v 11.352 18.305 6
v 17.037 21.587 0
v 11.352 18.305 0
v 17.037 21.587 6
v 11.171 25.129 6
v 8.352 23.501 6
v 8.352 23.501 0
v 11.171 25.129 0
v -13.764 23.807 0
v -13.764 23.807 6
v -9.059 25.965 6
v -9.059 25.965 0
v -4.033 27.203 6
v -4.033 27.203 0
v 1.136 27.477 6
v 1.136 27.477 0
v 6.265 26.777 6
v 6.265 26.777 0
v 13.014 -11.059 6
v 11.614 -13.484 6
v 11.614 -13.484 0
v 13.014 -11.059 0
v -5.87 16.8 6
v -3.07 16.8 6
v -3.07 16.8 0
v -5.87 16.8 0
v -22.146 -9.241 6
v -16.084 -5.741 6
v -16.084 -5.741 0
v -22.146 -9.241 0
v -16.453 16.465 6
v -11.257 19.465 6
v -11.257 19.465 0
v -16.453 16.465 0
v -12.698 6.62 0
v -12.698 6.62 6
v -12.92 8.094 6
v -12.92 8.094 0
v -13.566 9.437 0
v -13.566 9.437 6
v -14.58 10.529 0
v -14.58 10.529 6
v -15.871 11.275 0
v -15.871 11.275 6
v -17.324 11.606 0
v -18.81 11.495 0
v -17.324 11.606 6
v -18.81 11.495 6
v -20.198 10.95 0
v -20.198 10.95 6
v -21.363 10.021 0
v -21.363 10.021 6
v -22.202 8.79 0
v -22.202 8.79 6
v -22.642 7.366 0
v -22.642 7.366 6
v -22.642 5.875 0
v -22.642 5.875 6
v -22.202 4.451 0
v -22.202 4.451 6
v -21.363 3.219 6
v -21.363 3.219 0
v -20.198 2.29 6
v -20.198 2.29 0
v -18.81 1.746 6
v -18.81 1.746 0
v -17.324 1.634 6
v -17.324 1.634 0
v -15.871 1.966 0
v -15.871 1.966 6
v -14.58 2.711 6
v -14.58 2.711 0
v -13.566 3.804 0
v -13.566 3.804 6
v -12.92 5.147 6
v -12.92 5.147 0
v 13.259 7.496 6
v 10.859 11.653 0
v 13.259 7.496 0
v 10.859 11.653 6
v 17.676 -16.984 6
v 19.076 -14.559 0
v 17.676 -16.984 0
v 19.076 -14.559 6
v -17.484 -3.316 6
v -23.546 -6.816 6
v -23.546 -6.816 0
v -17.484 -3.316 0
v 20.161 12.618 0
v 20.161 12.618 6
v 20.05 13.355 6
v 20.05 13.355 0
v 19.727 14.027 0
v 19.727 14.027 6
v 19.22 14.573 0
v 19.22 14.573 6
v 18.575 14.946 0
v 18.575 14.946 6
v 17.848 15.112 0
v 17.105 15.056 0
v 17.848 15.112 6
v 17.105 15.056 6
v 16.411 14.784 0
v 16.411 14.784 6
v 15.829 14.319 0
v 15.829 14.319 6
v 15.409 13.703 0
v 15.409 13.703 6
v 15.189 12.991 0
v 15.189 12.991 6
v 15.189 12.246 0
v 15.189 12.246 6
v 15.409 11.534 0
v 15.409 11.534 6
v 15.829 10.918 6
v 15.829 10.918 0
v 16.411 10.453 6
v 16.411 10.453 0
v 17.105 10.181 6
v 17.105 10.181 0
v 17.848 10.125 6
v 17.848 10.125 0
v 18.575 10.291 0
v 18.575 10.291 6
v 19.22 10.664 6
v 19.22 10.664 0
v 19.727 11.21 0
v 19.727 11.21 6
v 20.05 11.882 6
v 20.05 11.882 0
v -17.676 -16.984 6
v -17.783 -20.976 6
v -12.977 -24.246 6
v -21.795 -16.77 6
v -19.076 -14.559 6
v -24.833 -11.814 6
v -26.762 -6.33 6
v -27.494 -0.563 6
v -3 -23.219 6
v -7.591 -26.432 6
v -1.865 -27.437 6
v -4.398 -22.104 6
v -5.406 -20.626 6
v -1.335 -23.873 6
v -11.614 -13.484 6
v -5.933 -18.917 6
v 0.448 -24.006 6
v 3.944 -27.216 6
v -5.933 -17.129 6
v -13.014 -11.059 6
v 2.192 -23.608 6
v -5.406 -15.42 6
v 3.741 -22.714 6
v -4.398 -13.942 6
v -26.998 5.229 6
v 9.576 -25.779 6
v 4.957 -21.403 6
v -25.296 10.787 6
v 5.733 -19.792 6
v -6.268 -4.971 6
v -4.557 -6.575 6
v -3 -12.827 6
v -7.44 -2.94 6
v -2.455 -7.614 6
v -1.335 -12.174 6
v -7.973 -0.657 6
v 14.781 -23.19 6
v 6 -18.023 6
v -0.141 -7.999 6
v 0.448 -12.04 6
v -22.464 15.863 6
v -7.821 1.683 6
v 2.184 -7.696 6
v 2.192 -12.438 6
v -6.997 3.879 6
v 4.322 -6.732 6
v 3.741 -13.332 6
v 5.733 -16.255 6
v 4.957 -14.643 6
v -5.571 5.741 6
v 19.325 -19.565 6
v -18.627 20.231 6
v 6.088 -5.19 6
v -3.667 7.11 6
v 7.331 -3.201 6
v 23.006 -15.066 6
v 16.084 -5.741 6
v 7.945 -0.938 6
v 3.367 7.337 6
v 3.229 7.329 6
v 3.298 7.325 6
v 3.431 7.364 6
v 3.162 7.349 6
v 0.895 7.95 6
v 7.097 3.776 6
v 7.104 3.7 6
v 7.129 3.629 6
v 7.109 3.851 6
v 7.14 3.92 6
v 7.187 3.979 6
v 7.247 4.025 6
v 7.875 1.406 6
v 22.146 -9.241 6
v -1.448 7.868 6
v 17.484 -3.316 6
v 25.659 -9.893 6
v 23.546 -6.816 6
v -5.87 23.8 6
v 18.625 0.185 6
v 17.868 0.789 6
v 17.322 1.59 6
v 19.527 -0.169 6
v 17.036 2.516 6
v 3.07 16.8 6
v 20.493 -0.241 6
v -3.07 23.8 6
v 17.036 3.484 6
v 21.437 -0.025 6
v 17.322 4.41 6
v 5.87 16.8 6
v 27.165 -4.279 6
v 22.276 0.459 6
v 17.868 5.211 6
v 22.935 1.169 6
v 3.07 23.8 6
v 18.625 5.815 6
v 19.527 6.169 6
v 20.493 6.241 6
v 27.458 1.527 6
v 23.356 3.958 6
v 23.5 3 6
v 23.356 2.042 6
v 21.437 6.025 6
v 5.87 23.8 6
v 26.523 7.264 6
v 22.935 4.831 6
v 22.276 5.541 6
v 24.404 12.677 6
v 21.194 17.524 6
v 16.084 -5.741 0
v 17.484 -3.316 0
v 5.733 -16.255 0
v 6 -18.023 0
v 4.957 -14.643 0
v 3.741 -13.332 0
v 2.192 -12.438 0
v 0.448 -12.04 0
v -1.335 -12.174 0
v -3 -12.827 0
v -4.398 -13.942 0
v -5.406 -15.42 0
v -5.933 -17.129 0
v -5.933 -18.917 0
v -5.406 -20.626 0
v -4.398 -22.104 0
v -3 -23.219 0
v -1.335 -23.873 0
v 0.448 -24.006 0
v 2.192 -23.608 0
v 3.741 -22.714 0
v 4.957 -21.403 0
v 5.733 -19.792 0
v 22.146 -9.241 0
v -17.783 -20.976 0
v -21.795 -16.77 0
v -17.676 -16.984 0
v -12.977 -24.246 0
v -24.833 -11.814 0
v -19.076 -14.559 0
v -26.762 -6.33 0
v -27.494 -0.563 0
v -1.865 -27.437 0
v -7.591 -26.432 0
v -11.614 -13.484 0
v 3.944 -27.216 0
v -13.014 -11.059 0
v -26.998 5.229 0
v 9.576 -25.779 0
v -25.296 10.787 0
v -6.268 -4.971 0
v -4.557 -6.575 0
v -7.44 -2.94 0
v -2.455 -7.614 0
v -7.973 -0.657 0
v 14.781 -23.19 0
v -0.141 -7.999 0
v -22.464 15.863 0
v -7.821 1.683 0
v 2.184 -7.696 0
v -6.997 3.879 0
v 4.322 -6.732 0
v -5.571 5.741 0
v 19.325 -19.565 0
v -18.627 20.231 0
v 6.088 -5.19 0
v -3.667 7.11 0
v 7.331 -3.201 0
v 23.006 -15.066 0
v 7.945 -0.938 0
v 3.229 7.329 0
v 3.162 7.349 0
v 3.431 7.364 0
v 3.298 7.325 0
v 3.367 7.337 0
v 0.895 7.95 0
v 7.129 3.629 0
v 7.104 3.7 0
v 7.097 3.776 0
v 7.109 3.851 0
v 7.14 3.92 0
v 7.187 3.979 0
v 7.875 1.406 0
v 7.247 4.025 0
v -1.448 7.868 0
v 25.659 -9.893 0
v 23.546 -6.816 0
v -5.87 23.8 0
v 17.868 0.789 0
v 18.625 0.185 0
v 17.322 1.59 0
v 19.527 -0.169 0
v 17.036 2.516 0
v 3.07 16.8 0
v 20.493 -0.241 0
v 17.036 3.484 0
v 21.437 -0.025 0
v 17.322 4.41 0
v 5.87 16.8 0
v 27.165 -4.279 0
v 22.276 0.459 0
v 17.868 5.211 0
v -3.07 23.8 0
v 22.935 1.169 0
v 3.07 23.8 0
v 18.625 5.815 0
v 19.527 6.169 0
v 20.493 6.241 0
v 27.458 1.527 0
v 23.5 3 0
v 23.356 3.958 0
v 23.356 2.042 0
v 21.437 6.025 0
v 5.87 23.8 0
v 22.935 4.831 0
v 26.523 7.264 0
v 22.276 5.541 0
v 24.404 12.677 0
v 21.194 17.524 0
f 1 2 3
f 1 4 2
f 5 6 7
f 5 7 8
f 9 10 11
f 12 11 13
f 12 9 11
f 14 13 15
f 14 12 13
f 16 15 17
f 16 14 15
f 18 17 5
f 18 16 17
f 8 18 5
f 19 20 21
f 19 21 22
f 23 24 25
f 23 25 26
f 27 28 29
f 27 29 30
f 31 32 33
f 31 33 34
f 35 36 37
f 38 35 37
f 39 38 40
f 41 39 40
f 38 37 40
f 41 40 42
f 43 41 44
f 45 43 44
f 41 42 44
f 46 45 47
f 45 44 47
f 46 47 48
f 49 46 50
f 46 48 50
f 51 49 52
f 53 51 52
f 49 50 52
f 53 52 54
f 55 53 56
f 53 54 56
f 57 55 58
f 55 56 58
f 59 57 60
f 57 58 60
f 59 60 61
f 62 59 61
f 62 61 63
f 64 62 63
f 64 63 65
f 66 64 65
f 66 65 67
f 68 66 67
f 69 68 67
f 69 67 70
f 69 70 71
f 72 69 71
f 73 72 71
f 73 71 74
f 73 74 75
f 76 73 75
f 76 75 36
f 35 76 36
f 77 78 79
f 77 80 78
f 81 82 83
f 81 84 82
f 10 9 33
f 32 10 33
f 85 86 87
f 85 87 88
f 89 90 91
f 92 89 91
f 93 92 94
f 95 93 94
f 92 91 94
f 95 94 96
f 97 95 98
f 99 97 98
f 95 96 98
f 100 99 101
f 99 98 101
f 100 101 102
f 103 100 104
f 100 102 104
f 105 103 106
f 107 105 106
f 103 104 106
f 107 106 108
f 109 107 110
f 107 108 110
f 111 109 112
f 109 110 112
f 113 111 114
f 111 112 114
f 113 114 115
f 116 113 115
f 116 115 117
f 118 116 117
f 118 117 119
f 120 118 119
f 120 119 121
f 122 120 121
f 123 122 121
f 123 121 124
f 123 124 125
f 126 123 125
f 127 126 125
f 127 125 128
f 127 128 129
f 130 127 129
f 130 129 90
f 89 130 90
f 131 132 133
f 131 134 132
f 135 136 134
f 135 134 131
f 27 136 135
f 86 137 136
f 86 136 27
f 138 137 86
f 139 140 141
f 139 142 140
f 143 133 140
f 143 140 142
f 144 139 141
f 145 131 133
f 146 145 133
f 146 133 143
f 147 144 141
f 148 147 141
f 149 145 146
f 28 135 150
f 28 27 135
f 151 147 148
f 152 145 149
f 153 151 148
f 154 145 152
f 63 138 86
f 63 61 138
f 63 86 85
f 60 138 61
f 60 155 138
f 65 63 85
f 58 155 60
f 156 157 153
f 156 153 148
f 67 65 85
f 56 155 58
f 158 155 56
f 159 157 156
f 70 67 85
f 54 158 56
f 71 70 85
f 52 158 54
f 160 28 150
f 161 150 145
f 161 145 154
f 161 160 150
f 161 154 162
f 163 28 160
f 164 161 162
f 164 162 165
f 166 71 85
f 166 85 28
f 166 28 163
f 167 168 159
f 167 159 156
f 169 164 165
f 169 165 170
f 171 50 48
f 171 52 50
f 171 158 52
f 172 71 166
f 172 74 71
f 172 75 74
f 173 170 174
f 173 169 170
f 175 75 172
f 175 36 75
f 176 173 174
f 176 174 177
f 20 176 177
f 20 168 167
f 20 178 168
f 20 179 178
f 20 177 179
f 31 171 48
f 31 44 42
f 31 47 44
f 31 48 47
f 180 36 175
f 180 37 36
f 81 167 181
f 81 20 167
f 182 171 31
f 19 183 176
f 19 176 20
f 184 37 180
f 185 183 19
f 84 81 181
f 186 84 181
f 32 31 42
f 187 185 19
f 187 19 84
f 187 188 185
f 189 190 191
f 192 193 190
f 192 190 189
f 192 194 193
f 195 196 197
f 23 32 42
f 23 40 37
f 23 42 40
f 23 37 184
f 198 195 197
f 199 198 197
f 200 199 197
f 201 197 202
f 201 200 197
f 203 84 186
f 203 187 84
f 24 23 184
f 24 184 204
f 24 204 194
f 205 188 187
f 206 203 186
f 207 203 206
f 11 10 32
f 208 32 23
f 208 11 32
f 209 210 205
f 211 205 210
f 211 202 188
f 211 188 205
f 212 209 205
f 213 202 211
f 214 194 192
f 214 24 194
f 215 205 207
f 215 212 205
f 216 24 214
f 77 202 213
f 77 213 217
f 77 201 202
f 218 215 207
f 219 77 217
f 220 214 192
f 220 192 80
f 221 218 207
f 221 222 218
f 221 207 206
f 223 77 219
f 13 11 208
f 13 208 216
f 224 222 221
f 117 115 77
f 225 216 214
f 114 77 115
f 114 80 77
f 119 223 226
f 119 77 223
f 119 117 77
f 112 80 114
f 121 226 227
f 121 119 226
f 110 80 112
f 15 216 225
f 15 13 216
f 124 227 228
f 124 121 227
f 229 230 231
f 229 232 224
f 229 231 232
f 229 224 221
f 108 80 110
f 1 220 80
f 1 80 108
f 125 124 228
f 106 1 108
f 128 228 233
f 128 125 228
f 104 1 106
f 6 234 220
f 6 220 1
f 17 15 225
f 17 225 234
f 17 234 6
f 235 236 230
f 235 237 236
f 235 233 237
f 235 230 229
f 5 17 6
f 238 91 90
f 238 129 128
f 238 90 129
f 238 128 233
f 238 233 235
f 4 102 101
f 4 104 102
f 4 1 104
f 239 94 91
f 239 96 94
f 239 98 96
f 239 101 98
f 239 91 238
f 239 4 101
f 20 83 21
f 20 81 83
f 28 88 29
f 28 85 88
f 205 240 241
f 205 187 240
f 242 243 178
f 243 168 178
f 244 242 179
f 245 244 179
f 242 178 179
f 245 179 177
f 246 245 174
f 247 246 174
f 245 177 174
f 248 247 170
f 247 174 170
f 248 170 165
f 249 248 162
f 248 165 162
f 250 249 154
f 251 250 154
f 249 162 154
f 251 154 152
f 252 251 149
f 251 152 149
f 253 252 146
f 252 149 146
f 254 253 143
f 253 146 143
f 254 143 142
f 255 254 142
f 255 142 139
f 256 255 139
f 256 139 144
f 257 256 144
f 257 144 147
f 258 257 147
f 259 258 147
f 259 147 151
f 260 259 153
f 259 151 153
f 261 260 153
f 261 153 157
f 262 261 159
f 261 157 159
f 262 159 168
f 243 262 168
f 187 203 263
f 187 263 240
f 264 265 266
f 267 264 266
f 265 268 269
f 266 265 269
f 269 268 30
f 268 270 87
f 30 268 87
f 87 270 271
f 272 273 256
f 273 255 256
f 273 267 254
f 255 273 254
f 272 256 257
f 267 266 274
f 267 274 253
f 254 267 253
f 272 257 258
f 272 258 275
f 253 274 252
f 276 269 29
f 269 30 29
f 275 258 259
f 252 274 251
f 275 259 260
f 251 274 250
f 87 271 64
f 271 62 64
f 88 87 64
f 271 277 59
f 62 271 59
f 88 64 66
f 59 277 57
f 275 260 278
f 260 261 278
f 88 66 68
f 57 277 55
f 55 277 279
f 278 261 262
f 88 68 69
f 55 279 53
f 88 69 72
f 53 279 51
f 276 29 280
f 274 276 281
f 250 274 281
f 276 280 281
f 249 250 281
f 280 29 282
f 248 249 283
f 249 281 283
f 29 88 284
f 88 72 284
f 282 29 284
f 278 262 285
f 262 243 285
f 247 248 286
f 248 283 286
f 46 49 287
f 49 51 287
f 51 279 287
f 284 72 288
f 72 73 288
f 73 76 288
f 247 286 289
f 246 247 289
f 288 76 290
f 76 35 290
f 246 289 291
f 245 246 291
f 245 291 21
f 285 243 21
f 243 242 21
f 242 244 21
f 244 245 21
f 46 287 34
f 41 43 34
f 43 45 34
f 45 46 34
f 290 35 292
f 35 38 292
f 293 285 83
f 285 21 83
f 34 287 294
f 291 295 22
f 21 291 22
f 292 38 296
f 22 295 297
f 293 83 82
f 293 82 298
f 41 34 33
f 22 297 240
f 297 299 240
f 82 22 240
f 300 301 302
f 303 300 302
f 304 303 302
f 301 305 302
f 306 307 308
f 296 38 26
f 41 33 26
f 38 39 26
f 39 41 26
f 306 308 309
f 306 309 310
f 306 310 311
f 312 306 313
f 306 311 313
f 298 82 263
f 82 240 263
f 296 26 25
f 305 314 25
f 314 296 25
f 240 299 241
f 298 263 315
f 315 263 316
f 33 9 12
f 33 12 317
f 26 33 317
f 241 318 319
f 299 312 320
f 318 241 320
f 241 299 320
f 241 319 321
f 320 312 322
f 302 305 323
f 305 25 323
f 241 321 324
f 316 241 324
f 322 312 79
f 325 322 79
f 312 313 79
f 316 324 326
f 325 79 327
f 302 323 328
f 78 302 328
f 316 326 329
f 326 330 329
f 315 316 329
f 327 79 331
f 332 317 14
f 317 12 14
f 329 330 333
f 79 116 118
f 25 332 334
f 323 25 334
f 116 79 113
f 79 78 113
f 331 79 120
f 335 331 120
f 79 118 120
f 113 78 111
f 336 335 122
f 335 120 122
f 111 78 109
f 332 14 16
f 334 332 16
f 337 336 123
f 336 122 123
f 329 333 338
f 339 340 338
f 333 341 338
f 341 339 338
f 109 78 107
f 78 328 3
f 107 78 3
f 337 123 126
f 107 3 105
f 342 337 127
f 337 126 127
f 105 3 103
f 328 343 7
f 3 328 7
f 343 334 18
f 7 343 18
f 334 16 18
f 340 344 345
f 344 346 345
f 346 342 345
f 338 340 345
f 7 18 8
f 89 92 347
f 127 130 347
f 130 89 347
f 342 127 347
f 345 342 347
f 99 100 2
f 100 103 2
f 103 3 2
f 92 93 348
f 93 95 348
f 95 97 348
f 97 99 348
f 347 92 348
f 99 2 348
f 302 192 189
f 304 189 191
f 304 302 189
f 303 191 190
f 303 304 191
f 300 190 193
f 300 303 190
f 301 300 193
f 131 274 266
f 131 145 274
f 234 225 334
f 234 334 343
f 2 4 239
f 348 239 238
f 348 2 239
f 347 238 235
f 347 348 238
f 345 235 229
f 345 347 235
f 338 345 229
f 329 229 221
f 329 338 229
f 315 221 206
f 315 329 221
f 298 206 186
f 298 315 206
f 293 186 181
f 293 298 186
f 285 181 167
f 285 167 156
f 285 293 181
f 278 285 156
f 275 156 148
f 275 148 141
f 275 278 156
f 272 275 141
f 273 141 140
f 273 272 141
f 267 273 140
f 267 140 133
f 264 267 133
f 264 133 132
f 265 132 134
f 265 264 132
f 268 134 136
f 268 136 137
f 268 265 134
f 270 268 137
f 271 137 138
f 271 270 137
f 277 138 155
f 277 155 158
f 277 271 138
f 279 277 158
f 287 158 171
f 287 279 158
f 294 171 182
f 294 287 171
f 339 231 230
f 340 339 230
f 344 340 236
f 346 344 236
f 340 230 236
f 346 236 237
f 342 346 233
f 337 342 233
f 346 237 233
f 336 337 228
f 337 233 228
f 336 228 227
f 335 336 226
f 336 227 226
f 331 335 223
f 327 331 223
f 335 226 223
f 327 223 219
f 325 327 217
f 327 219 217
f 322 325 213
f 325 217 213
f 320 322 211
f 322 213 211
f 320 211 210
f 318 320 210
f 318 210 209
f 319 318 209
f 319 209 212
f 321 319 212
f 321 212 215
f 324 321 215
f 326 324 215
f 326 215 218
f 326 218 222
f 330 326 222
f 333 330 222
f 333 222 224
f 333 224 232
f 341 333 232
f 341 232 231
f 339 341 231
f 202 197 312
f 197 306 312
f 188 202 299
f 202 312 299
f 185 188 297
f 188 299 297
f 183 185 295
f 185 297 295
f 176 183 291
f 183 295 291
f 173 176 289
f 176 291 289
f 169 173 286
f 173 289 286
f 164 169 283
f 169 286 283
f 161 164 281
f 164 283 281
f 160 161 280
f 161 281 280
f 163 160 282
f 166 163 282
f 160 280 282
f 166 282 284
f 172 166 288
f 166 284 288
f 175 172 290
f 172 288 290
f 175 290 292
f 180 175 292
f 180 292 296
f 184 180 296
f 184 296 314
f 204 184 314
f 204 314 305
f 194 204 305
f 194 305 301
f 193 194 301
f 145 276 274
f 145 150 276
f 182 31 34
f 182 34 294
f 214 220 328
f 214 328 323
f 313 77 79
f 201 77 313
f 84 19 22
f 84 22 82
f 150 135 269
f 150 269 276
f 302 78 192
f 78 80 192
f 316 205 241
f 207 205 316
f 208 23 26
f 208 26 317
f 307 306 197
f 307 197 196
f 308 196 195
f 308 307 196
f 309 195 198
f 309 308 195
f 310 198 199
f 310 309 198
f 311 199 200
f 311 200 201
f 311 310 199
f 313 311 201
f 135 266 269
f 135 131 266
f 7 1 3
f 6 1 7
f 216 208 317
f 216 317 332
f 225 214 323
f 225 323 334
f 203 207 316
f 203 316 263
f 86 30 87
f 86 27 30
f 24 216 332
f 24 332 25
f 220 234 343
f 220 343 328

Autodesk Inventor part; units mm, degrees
ref_plane "YZ Plane" through (0, 0, 0) normal (1, 0, 0) x (0, 1, 0)
ref_plane "XZ Plane" through (0, 0, 0) normal (0, 1, 0) x (-1, 0, 0)
ref_plane "XY Plane" through (0, 0, 0) normal (0, 0, 1) x (1, 0, 0)
sketch "Sketch2" plane through (0, 0, 0) normal (0, 0, 1) x (1, 0, 0)
  circle A0 centre (0, 0) radius 27.5
  circle A1 centre (0, 0) radius 8
  dimension "d0" = 55
  dimension "d1" = 16
extrude "Extrusion1" add sketch "Sketch2" along normal blind 6
sketch "Sketch3" plane through (0, 0, 6) normal (0, 0, 1) x (1, 0, 0)
  circle A0 centre (0, 0) radius 22.5 construction
  circle A1 centre (0, 0) radius 27.5 projected
  line L0 (-5.87, 23.8) -> (-3.07, 23.8)
  line L1 (-3.07, 23.8) -> (-3.07, 16.8)
  line L2 (-3.07, 16.8) -> (-5.87, 16.8)
  line L3 (-5.87, 16.8) -> (-5.87, 23.8)
  line L4 (0, 0) -> (0, 27.8091) construction
  line L5 (3.07, 23.8) -> (5.87, 23.8)
  line L6 (5.87, 23.8) -> (5.87, 16.8)
  line L7 (5.87, 16.8) -> (3.07, 16.8)
  line L8 (3.07, 16.8) -> (3.07, 23.8)
  line L9 (-17.6764, -16.9836) -> (-19.0764, -14.5587)
  line L10 (-19.0764, -14.5587) -> (-13.0142, -11.0587)
  line L11 (-13.0142, -11.0587) -> (-11.6142, -13.4836)
  line L12 (-11.6142, -13.4836) -> (-17.6764, -16.9836)
  line L13 (-22.1464, -9.2413) -> (-23.5464, -6.8164)
  line L14 (-23.5464, -6.8164) -> (-17.4842, -3.3164)
  line L15 (-17.4842, -3.3164) -> (-16.0842, -5.7413)
  line L16 (-16.0842, -5.7413) -> (-22.1464, -9.2413)
  line L17 (23.5464, -6.8164) -> (22.1464, -9.2413)
  line L18 (22.1464, -9.2413) -> (16.0842, -5.7413)
  line L19 (16.0842, -5.7413) -> (17.4842, -3.3164)
  line L20 (17.4842, -3.3164) -> (23.5464, -6.8164)
  line L21 (19.0764, -14.5587) -> (17.6764, -16.9836)
  line L22 (17.6764, -16.9836) -> (11.6142, -13.4836)
  line L23 (11.6142, -13.4836) -> (13.0142, -11.0587)
  line L24 (13.0142, -11.0587) -> (19.0764, -14.5587)
  line L25 (0, 27.5) -> (22.8099, 27.5) construction
  circle A2 centre (0, 0) radius 27.5 projected
  dimension "d4" = 5
  dimension "d5" = 2.8
  dimension "d6" = 7
  dimension "d9" = 2.8
  dimension "d10" = 7
  dimension "d12" = 3.07
  dimension "d13" = 3.07
  dimension "d16" = 360
  dimension "d20" = 3.7
extrude "Extrusion2" cut sketch "Sketch3" against normal blind 6 contours L0 L1 L2 L3 | L5 L6 L7 L8 | L9 L10 L11 L12 | L13 L14 L15 L16 | L17 L18 L19 L20 | L21 L22 L23 L24
sketch "Sketch7" plane through (0, 0, 6) normal (0, 0, 1) x (1, 0, 0)
  line L0 (19.5793, 23.0548) -> (11.3521, 18.3048)
  line L1 (11.3521, 18.3048) -> (8.3521, 23.501)
  line L2 (8.3521, 23.501) -> (16.5793, 28.251)
  line L3 (16.5793, 28.251) -> (19.5793, 23.0548)
  line L4 (23.5464, -6.8164) -> (5.87, 23.8) construction
  line L5 (5.87, 23.8) -> (16.4282, 29.8958) construction
  arc A0 (27.5, 0) -> (27.5, 0) centre (0, 0) ccw projected
  dimension "d16" = 360
  dimension "d59" = 6
  dimension "d60" = 9.5
  dimension "d100" = 2
  dimension "d101" = 1.5
extrude "Extrusion6" cut sketch "Sketch7" against normal blind 10 contours L0 A0 L2 L3 | L0 L1 L2 A0 picked at (10.9756, 21.9728)
sketch "Sketch6" plane through (0, 0, 6) normal (0, 0, 1) x (1, 0, 0)
  line L0 (23.5464, -6.8164) -> (5.87, 23.8) construction
  line L1 (-16.4532, 16.4649) -> (-19.4532, 21.6611)
  line L2 (-19.4532, 21.6611) -> (-14.2571, 24.6611)
  line L3 (-14.2571, 24.6611) -> (-11.2571, 19.4649)
  line L4 (-11.2571, 19.4649) -> (-16.4532, 16.4649)
  line L5 (-5.87, 16.8) -> (-5.87, 23.8) projected
  line L6 (-5.87, 23.8) -> (-7.957, 25.0049) construction
  line L7 (-23.5464, -6.8164) -> (-5.87, 23.8) construction
  circle A0 centre (0, 0) radius 27.5 projected
  line L8 (10.8586, 11.6529) -> (13.2586, 7.496)
  circle A1 centre (0, 0) radius 8 projected
  line L9 (5.87, 23.8) -> (-0.452, 20.15) construction
  line L10 (13.2586, 7.496) -> (0.9452, 0.3868)
  line L11 (10.8586, 11.6529) -> (-2.1318, 4.1529)
  line L12 (-2.1318, 4.1529) -> (0.9452, 0.3868)
  line L13 (17.0369, 21.5869) -> (11.3521, 18.3048) projected
  line L14 (11.3521, 18.3048) -> (8.3521, 23.501) projected
  dimension "d47" = 6
  dimension "d48" = 6
  dimension "d71" = 4.8
  dimension "d84" = 15.2302
  dimension "d96" = 14.2183
  dimension "d97" = 15
  dimension "d102" = 5.514
  dimension "d103" = 12.3093
  dimension "d104" = 19
extrude "Extrusion7" cut sketch "Sketch6" against normal blind 10 contours L1 A0 L3 L4 | L1 L2 L3 A0 | L8 L10 A1 L11 | A1 L10 L12 L11 picked at (-14.9352, 19.1568) picked at (0.7041, 3.9426)
fillet "Fillet4" radius 0.3 2 edges at (3.2988, 7.2882, 3) (6.996, 3.8802, 3)
sketch "Sketch13" plane through (0, 0, 6) normal (0, 0, 1) x (1, 0, 0)
  circle A0 centre (0, -18.0231) radius 6
  circle A1 centre (-17.6976, 6.6203) radius 5
  circle A2 centre (20.25, 3) radius 3.25
  circle A3 centre (17.6614, 12.6185) radius 2.5
  line L0 (-11.6142, -13.4836) -> (-17.6764, -16.9836) projected
  line L1 (17.6764, -16.9836) -> (11.6142, -13.4836) projected
  line L2 (-23.5464, -6.8164) -> (-17.4842, -3.3164) projected
  line L3 (-5.87, 16.8) -> (-5.87, 23.8) projected
  line L4 (-16.4532, 16.4649) -> (-18.6273, 20.2305) projected
  point P0 (0, 0)
  dimension "d146" = 12
  dimension "d147" = 6.5
  dimension "d148" = 10
  dimension "d151" = 5
  dimension "d154" = 9.7385
  dimension "d155" = 9.7385
  dimension "d156" = 8.7122
  dimension "d158" = 6
extrude "Extrusion16" cut sketch "Sketch13" against normal blind 10
properties part number "Gripper V 10.0 base 6mm"
